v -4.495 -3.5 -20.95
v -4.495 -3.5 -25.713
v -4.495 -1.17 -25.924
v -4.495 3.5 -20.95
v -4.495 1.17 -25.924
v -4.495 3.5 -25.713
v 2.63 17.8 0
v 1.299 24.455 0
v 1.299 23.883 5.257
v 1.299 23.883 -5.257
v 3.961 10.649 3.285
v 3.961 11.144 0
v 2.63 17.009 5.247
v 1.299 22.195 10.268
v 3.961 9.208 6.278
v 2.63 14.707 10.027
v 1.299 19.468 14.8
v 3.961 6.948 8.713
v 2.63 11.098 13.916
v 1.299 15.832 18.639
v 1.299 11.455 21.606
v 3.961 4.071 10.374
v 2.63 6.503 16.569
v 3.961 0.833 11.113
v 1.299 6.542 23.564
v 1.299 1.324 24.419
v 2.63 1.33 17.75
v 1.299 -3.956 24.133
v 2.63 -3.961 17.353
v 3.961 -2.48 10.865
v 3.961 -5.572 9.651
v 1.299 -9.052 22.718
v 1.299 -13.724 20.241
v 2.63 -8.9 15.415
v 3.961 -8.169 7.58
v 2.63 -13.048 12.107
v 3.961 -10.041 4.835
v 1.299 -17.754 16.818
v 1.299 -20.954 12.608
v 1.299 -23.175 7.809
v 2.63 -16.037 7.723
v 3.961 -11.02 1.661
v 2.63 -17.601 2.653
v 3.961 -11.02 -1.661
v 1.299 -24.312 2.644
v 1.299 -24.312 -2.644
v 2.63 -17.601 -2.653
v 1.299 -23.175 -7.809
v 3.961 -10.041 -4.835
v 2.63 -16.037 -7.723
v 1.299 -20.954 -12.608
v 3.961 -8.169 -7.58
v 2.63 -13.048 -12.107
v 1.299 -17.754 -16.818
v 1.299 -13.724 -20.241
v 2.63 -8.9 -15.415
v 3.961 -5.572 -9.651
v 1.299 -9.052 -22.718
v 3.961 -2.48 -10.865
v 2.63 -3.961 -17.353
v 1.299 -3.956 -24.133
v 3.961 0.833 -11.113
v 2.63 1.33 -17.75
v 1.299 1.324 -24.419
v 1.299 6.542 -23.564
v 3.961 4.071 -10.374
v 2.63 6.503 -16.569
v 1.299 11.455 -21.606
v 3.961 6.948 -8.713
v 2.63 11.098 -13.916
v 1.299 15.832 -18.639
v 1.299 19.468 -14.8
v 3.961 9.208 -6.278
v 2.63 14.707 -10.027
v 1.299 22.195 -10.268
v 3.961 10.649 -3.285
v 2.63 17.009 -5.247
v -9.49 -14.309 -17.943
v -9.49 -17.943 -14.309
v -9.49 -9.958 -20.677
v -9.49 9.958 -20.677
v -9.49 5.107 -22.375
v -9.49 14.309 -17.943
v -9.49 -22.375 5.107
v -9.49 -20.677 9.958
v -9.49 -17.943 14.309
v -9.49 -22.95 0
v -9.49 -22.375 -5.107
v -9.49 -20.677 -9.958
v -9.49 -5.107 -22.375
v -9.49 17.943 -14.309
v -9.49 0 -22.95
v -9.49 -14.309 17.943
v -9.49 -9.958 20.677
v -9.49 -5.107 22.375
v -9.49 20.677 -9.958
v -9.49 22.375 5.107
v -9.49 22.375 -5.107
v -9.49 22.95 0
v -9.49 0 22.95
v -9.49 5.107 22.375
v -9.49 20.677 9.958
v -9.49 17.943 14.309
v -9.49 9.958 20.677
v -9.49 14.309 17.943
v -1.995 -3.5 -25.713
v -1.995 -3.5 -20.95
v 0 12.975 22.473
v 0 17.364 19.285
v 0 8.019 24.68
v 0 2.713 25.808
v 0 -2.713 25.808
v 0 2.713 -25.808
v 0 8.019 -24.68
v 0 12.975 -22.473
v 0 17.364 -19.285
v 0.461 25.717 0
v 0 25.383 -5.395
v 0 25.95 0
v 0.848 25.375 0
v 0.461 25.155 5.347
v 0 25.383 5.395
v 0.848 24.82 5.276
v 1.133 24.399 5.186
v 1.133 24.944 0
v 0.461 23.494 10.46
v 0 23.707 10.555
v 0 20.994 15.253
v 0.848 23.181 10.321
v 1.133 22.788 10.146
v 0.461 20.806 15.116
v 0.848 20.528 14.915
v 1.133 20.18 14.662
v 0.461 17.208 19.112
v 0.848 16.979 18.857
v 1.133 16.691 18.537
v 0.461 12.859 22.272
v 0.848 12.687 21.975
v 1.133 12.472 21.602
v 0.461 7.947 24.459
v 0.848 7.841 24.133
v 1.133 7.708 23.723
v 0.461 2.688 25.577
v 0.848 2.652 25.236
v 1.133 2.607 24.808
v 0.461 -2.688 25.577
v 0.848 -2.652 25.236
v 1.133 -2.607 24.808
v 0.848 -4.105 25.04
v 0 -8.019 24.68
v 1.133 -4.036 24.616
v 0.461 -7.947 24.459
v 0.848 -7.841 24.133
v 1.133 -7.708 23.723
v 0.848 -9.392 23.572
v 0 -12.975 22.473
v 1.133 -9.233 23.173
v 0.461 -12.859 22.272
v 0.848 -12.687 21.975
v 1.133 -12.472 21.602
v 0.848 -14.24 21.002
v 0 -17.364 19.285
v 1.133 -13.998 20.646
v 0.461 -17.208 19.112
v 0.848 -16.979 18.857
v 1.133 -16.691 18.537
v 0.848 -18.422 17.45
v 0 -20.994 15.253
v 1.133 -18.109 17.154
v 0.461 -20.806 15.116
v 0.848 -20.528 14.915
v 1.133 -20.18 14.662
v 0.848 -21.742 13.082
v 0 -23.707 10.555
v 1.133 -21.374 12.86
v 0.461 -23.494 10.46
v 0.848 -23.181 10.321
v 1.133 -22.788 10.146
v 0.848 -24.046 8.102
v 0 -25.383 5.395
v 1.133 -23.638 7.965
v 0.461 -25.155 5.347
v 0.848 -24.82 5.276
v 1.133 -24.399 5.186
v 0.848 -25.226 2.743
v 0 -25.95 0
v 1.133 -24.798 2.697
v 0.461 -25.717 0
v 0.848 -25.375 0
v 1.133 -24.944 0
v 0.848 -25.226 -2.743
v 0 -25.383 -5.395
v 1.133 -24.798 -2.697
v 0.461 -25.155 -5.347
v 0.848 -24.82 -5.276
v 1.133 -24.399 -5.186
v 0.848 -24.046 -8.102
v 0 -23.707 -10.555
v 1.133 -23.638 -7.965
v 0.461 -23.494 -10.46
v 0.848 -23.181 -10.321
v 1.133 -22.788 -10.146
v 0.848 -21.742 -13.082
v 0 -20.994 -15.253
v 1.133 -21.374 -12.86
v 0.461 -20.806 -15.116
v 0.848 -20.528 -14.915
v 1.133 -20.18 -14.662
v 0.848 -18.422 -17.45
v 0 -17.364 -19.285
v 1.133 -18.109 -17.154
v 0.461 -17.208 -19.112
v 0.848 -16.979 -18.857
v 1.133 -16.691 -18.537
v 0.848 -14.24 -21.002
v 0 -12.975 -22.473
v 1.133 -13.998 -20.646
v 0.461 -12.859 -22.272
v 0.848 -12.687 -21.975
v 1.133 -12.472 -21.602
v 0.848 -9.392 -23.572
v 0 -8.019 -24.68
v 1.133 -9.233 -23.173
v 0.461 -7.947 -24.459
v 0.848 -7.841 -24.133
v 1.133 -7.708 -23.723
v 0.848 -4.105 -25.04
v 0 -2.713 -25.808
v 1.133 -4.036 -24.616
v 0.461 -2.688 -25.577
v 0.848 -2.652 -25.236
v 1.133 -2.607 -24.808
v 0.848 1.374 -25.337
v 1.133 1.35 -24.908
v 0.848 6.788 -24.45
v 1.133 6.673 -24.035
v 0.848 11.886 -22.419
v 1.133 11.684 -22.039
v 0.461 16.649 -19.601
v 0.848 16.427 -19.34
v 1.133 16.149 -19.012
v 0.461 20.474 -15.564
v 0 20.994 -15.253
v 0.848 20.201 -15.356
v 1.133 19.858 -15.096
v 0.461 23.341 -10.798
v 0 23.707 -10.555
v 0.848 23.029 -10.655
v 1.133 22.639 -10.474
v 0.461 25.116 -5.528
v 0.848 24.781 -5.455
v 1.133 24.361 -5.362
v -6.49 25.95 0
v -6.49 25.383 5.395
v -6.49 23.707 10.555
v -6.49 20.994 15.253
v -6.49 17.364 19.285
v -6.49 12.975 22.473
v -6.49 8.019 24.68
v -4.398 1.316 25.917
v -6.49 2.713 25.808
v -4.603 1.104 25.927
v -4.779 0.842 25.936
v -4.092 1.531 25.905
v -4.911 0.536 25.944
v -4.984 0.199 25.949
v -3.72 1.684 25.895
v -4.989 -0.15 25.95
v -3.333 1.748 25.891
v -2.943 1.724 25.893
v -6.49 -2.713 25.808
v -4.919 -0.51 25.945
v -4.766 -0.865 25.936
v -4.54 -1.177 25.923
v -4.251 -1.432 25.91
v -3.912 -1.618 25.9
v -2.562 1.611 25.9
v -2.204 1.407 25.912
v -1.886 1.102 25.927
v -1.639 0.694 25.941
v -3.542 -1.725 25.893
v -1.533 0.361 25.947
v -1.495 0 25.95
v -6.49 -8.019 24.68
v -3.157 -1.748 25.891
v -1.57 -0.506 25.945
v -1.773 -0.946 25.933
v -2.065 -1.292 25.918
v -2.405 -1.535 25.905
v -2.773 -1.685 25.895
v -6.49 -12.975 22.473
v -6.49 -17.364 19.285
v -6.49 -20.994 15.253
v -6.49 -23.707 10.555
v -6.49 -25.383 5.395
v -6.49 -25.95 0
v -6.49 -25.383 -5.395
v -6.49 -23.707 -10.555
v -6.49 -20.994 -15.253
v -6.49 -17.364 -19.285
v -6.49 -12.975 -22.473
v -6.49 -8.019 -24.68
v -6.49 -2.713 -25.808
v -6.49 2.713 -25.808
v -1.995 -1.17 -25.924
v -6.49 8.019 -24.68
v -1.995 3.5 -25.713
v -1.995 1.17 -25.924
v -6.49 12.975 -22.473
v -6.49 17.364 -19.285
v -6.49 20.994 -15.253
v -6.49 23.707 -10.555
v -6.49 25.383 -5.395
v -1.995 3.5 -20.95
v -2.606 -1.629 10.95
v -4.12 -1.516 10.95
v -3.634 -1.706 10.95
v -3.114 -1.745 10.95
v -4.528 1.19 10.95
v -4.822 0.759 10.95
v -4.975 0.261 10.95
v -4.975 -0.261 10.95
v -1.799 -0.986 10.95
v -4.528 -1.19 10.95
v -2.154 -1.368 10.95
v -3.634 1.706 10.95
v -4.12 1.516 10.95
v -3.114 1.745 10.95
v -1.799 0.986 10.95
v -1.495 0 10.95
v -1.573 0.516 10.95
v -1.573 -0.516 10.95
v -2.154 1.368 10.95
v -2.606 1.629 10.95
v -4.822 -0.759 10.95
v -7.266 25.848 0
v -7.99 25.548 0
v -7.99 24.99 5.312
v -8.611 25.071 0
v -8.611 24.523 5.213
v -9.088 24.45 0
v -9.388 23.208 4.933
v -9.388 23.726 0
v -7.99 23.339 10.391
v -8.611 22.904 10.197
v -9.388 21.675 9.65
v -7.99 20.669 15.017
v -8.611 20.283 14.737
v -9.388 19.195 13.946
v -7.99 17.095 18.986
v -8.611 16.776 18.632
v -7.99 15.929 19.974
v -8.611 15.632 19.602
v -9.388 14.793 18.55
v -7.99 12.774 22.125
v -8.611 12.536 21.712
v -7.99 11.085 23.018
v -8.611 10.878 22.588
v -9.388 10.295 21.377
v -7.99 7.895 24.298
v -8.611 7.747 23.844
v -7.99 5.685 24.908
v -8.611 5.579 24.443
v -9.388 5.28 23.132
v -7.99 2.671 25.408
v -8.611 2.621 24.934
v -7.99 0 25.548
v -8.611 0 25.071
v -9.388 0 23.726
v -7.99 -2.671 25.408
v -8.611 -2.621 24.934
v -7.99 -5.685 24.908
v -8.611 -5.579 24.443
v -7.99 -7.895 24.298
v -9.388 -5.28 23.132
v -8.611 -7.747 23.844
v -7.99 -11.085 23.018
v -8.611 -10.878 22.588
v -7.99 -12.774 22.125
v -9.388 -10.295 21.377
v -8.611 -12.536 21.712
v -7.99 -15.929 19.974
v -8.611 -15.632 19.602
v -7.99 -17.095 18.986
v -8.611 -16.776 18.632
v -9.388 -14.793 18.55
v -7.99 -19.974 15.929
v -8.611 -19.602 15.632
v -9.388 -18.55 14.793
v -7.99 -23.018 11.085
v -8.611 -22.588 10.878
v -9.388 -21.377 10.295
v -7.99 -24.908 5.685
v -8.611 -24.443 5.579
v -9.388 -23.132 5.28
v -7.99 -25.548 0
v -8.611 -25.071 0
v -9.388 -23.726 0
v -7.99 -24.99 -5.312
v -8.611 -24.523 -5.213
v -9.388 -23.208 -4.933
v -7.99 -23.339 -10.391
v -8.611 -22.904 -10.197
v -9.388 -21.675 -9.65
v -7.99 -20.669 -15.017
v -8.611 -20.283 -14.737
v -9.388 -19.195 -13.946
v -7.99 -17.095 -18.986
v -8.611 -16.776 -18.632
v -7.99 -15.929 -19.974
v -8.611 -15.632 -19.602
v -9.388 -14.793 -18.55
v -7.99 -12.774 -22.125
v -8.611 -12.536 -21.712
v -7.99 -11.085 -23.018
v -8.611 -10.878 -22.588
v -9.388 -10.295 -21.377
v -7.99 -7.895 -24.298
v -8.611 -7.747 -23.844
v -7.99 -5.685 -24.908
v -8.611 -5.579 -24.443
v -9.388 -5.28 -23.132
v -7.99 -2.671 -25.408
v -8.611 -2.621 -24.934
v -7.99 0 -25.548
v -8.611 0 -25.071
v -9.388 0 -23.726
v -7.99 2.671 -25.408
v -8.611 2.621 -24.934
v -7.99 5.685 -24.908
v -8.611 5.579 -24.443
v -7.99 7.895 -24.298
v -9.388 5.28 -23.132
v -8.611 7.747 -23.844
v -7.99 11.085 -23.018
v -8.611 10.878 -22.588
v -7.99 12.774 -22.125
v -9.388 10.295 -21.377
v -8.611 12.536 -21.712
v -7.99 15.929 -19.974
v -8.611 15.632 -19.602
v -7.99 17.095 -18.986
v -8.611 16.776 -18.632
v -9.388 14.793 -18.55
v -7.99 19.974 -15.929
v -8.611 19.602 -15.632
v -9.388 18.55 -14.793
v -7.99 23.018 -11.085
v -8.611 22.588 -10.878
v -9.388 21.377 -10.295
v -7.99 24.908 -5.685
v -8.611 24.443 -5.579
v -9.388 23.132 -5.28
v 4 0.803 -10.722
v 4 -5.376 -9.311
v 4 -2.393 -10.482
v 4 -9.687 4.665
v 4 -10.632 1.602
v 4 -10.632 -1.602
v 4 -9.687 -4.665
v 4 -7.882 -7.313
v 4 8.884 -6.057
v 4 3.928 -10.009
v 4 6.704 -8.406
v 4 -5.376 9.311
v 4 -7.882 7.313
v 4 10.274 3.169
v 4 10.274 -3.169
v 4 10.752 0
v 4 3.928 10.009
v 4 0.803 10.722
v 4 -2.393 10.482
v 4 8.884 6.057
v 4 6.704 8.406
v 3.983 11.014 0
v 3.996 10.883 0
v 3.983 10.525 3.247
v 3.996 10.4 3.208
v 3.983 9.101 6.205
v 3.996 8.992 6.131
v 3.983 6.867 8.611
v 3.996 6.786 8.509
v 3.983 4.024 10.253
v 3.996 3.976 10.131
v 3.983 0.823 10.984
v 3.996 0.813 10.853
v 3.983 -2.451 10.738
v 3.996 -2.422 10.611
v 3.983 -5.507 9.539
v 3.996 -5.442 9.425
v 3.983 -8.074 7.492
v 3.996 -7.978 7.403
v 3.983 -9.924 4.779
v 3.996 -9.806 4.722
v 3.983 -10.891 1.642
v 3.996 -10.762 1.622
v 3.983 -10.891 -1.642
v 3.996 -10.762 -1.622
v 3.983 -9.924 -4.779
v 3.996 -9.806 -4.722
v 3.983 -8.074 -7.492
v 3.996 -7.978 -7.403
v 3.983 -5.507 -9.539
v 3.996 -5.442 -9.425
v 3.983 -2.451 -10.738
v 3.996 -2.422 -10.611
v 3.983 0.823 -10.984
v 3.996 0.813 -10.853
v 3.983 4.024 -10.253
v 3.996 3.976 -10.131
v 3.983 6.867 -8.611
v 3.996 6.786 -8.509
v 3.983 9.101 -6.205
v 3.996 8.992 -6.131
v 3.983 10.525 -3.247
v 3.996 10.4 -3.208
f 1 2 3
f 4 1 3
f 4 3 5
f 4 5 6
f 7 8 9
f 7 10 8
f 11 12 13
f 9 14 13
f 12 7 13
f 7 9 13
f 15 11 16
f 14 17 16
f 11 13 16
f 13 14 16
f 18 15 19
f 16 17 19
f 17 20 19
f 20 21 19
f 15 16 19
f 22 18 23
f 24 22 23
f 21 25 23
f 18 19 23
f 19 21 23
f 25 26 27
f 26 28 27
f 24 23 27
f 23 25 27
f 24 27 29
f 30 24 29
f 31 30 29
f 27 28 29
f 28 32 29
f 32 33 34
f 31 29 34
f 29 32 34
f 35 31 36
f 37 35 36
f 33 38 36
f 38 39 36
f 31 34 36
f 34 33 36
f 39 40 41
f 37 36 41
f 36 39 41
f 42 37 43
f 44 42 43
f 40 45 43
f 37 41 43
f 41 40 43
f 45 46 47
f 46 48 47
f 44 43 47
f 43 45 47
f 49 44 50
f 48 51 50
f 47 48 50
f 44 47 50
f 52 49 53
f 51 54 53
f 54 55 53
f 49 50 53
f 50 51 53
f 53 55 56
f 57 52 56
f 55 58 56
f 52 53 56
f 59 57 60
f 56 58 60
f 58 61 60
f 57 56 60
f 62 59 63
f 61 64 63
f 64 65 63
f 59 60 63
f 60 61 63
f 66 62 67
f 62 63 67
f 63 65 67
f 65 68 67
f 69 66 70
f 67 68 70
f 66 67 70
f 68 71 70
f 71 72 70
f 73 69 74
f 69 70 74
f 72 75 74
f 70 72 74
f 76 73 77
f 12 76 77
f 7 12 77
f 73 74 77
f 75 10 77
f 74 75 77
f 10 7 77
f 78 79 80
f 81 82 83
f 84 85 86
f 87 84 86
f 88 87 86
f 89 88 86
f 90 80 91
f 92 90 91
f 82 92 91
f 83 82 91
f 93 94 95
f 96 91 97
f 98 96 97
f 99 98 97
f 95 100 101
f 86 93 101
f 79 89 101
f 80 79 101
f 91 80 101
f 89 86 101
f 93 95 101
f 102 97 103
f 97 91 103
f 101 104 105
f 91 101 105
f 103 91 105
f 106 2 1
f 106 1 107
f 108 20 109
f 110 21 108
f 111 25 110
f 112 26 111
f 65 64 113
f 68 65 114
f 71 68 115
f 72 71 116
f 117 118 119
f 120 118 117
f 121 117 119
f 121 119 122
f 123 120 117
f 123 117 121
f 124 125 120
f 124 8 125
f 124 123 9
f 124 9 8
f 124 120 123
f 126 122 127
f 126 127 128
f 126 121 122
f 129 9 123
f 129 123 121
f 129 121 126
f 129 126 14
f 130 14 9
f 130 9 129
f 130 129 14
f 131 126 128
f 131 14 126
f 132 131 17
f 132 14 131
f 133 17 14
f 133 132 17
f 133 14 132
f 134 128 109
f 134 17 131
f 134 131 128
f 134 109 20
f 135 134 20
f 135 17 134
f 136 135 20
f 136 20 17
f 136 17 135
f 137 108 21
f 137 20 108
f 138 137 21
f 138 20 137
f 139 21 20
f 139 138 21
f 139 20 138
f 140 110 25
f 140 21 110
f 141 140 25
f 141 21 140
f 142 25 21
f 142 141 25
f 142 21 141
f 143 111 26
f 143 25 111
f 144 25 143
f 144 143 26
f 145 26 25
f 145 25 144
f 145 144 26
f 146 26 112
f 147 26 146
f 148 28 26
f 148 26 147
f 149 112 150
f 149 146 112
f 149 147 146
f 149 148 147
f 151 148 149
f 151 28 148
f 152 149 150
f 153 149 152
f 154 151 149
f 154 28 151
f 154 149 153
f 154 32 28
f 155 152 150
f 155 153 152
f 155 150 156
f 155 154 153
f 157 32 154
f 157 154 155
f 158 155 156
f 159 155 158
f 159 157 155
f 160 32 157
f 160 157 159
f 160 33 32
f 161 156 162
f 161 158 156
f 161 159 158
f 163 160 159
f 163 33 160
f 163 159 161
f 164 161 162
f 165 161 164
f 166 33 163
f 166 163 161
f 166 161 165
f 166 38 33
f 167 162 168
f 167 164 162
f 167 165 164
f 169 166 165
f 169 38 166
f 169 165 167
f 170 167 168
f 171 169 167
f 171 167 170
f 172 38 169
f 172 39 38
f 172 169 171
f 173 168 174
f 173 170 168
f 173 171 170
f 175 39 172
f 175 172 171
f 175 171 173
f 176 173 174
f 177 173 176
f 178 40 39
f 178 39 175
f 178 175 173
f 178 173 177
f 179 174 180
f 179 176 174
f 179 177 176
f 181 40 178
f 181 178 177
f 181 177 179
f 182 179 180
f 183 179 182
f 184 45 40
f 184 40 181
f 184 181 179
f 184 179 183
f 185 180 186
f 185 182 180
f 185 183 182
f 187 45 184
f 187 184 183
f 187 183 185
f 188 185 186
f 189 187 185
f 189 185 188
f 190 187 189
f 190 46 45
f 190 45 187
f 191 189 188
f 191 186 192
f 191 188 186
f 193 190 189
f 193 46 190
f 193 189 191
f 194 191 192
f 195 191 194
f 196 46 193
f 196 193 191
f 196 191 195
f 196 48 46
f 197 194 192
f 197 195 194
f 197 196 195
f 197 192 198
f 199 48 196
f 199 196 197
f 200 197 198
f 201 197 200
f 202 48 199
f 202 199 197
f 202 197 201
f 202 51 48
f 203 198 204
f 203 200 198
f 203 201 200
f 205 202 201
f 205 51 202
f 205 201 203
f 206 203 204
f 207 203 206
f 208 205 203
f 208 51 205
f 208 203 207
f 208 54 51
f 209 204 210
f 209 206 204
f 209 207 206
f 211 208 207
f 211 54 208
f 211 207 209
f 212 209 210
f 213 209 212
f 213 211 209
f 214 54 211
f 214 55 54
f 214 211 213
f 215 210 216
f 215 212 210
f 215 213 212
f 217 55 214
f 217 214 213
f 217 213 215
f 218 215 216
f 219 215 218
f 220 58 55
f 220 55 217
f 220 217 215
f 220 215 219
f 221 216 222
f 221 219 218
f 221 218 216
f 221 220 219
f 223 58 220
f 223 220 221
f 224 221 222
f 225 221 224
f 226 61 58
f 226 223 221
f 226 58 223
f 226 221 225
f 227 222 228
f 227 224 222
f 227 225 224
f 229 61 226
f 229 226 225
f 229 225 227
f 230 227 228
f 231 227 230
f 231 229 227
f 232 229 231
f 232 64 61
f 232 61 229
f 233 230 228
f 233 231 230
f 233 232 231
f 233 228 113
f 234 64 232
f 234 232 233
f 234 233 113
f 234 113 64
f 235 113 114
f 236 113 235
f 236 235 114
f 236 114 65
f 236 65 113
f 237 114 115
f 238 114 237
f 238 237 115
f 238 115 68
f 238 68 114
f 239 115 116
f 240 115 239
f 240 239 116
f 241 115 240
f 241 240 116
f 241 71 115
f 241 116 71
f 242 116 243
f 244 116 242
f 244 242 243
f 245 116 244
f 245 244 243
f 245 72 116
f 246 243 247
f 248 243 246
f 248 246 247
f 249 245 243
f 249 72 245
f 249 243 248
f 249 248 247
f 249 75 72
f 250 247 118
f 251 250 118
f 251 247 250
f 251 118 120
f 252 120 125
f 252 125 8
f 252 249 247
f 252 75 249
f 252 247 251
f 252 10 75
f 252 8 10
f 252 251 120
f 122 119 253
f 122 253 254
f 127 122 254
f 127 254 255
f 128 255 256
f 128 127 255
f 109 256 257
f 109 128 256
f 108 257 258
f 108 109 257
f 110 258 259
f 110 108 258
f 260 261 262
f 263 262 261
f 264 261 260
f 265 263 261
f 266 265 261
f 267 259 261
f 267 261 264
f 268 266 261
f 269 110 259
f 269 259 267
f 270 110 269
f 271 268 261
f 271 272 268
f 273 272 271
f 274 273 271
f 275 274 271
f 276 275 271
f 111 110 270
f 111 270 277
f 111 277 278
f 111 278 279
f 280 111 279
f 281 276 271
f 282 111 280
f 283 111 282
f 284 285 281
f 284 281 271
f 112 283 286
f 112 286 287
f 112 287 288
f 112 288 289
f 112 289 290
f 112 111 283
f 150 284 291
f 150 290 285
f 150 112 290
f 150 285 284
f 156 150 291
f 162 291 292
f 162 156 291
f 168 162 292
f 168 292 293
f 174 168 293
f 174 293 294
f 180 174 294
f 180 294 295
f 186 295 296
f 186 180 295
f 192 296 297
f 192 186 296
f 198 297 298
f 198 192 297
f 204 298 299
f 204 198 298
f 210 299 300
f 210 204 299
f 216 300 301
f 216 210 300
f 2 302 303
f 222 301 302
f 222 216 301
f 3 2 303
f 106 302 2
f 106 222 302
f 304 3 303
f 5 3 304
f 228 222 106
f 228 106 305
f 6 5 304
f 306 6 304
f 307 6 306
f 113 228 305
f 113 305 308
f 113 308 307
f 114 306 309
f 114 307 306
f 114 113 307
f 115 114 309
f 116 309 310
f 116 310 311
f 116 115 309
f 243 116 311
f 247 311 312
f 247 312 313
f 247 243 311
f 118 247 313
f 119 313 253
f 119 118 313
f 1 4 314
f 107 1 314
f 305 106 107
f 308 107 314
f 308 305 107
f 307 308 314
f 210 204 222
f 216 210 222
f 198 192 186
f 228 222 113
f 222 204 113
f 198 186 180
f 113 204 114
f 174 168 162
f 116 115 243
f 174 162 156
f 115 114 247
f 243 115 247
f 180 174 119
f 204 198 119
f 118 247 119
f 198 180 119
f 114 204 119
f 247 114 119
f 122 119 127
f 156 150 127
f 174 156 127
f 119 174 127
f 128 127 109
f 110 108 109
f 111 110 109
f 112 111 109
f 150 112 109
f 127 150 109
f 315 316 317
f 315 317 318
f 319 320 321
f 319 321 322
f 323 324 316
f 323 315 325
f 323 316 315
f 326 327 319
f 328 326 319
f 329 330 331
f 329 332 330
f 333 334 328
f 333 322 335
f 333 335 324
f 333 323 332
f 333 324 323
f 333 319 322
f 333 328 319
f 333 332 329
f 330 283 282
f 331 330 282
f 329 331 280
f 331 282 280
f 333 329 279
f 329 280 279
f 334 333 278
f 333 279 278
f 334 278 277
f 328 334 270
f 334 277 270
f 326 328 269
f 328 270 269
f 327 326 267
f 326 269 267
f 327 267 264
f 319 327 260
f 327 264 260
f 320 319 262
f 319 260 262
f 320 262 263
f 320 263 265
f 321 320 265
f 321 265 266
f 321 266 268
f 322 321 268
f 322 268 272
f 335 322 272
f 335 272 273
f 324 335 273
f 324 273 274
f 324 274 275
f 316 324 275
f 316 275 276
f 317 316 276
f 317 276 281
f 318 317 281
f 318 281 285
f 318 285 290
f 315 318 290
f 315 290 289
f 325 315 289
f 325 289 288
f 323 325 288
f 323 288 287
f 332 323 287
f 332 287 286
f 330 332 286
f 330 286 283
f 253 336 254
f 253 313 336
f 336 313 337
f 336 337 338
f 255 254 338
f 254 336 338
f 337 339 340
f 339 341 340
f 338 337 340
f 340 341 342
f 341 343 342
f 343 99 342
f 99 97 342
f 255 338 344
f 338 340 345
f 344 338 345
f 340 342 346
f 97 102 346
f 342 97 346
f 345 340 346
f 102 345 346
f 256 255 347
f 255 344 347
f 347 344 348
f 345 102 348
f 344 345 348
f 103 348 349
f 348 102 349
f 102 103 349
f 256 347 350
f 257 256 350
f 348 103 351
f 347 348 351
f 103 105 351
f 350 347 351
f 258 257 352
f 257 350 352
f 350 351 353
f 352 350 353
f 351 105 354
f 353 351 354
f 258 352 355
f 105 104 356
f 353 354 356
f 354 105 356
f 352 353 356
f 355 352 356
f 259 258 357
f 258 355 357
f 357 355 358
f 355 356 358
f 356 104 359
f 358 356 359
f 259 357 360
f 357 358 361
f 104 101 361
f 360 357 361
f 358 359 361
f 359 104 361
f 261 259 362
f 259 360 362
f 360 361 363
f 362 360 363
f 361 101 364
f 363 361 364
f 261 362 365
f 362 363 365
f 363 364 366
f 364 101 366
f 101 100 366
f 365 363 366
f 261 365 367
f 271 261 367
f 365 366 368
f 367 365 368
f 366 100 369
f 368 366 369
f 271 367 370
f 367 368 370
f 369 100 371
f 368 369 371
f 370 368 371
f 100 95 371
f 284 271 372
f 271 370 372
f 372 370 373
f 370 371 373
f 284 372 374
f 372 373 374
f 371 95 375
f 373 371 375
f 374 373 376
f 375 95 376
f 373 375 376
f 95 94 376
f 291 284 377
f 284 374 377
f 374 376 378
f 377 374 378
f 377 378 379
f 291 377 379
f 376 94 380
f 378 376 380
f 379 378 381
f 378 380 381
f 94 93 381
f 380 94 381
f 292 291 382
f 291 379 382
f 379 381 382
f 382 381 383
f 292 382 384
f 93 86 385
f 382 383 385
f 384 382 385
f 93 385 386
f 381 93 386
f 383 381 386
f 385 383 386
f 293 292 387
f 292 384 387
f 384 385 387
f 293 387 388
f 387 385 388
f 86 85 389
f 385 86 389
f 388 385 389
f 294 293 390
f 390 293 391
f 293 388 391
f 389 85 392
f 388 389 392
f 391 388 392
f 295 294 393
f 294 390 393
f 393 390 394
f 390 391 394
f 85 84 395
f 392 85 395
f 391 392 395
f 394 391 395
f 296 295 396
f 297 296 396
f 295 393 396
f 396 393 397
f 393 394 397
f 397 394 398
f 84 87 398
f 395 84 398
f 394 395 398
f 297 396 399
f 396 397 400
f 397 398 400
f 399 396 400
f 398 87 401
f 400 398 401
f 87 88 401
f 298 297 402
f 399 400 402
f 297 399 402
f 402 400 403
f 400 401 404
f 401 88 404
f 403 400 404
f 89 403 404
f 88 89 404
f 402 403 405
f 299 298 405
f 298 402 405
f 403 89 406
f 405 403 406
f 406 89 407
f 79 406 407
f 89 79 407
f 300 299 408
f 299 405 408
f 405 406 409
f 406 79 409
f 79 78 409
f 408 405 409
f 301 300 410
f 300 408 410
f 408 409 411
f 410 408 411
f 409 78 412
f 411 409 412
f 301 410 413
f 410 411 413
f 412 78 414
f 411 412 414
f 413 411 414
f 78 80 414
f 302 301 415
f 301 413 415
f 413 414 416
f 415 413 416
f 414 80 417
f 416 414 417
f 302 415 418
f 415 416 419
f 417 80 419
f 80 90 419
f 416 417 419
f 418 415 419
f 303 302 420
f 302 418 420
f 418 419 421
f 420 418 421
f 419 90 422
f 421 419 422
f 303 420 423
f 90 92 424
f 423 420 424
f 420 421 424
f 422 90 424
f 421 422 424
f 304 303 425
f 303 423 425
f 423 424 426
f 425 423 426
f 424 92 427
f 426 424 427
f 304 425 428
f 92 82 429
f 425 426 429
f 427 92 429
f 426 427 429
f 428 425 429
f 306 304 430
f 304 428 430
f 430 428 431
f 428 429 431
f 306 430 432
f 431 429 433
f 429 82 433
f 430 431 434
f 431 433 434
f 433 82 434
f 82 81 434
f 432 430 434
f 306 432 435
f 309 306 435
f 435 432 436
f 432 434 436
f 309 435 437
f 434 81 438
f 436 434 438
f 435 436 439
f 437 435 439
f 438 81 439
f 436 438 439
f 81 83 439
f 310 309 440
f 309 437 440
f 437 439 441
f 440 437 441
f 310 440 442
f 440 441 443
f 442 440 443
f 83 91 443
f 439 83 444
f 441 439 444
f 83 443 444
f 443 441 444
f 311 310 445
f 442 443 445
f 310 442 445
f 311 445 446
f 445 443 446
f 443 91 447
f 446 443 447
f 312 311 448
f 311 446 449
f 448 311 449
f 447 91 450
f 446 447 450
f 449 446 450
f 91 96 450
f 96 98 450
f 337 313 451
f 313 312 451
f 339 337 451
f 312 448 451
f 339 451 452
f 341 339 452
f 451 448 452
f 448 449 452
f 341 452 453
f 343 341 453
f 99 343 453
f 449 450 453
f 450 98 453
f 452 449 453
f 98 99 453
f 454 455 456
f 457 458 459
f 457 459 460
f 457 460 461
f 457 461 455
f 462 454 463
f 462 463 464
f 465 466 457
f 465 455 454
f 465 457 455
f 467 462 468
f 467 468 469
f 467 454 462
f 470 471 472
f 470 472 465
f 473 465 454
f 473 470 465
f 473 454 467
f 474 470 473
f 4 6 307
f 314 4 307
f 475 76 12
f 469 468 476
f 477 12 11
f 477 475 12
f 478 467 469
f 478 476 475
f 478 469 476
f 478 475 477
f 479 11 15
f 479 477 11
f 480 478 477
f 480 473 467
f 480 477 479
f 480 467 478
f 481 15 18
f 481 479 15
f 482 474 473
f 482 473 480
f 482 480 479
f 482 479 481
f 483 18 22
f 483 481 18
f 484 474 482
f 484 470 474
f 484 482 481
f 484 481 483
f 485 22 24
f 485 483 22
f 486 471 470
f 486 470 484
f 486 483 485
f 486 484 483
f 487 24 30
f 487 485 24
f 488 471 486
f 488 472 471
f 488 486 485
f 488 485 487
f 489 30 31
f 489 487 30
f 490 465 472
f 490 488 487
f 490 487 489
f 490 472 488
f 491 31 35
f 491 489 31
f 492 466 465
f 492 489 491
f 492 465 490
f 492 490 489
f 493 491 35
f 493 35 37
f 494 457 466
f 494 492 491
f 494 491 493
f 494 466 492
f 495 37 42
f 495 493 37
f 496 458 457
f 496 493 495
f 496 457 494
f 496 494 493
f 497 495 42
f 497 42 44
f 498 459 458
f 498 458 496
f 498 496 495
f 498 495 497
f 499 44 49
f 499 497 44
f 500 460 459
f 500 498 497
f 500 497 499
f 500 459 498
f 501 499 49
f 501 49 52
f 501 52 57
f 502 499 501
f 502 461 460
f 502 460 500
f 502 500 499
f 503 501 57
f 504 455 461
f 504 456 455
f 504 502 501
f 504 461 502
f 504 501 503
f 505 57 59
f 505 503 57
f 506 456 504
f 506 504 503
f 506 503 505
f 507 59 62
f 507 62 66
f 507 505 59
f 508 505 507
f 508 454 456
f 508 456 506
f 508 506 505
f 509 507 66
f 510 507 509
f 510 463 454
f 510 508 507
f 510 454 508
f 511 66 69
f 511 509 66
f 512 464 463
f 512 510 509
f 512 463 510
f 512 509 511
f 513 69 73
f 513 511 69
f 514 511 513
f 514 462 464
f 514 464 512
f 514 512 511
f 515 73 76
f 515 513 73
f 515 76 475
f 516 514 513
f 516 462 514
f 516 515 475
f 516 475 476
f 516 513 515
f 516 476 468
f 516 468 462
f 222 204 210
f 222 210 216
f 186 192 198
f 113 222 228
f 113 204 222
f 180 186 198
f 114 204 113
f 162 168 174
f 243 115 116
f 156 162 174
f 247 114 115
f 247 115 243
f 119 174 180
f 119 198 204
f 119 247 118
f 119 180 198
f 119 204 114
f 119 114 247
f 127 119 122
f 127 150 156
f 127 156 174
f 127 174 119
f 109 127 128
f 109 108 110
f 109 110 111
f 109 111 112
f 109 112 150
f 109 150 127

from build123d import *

# Parameters (mm, degrees)
F0_R      = 25.95
F1_DEPTH  = 4
F2_SIZE2  = 3
F2_SIZE   = 15
F3_DEPTH  = 9.49
F4_R      = 3
F7_R      = 1.75
F8_DEPTH  = 15
F10_W     = 2.5
F10_H     = 7
F11_DEPTH = 5


# Not quite as in the source:
# - a fillet or chamfer that OpenCascade refuses, or shapes differently, is made with other operations: its cross-section is extruded or revolved along the edge and cut away or added


with BuildPart() as f1:
    # F0 (on Right) → F1 (new body)
    with BuildSketch(Plane.YZ):
        Circle(F0_R)
    extrude(amount=F1_DEPTH)

    # F2
    f2_edges = [f1.edges().sort_by_distance(p)[0] for p in [
        (4, -25.95, 0),
    ]]
    f2_side = f1.faces().sort_by_distance((4, 0, 0))[0]
    chamfer(f2_edges, length=F2_SIZE, length2=F2_SIZE2, reference=f2_side)


with BuildPart() as f3:
    # F3 (new): a face of the model
    f3_faces = [f1.part.faces().sort_by_distance(p)[0] for p in [
        (0, 0, 0),
    ]]
    extrude(f3_faces, amount=F3_DEPTH)

    # F4
    f4_edges = [f3.edges().sort_by_distance(p)[0] for p in [
        (-9.49, -25.95, 0),
    ]]
    fillet(f4_edges, radius=F4_R)

    # F7 (on offset) → F8 (cut)
    with BuildSketch(Plane.XY.offset(25.95)):
        with Locations((-3.245, 0)):
            Circle(F7_R)
    extrude(amount=-F8_DEPTH, mode=Mode.SUBTRACT)

    # F10 (on offset) → F11 (cut)
    with BuildSketch(Plane.XY.offset(-25.95)):
        with Locations((-3.245, 0)):
            Rectangle(F10_W, F10_H)
    extrude(amount=F11_DEPTH, mode=Mode.SUBTRACT)


with BuildPart() as f1_1:
    add(f1.part)

    # F5: fillet of radius 2 on 2 edges, made by hand

    # F5_s1 → F5_t2 (revolve, cut)
    with BuildSketch(Plane.XY):
        with BuildLine():
            ThreePointArc((0, 25.95), (0.8475338818, 25.3745907932), (1.2989941134, 24.455029433))
            Line((1.2989941134, 24.455029433), (1, 25.95))
            Line((1, 25.95), (0, 25.95))
        make_face()
    revolve(axis=Axis((1, 0, 0), (1, 0, 0)), mode=Mode.SUBTRACT)

    # F5_s3 → F5_t4 (revolve, cut)
    with BuildSketch(Plane.XY):
        with BuildLine():
            ThreePointArc((3.9611613514, 11.1441932431), (3.9902666533, 10.9490362087), (4, 10.7519609728))
            Line((4, 10.7519609728), (4, 10.95))
            Line((4, 10.95), (3.9611613514, 11.1441932431))
        make_face()
    revolve(axis=Axis((4, 0, 0), (1, 0, 0)), mode=Mode.SUBTRACT)


solid = Compound([f3.part, f1_1.part])
